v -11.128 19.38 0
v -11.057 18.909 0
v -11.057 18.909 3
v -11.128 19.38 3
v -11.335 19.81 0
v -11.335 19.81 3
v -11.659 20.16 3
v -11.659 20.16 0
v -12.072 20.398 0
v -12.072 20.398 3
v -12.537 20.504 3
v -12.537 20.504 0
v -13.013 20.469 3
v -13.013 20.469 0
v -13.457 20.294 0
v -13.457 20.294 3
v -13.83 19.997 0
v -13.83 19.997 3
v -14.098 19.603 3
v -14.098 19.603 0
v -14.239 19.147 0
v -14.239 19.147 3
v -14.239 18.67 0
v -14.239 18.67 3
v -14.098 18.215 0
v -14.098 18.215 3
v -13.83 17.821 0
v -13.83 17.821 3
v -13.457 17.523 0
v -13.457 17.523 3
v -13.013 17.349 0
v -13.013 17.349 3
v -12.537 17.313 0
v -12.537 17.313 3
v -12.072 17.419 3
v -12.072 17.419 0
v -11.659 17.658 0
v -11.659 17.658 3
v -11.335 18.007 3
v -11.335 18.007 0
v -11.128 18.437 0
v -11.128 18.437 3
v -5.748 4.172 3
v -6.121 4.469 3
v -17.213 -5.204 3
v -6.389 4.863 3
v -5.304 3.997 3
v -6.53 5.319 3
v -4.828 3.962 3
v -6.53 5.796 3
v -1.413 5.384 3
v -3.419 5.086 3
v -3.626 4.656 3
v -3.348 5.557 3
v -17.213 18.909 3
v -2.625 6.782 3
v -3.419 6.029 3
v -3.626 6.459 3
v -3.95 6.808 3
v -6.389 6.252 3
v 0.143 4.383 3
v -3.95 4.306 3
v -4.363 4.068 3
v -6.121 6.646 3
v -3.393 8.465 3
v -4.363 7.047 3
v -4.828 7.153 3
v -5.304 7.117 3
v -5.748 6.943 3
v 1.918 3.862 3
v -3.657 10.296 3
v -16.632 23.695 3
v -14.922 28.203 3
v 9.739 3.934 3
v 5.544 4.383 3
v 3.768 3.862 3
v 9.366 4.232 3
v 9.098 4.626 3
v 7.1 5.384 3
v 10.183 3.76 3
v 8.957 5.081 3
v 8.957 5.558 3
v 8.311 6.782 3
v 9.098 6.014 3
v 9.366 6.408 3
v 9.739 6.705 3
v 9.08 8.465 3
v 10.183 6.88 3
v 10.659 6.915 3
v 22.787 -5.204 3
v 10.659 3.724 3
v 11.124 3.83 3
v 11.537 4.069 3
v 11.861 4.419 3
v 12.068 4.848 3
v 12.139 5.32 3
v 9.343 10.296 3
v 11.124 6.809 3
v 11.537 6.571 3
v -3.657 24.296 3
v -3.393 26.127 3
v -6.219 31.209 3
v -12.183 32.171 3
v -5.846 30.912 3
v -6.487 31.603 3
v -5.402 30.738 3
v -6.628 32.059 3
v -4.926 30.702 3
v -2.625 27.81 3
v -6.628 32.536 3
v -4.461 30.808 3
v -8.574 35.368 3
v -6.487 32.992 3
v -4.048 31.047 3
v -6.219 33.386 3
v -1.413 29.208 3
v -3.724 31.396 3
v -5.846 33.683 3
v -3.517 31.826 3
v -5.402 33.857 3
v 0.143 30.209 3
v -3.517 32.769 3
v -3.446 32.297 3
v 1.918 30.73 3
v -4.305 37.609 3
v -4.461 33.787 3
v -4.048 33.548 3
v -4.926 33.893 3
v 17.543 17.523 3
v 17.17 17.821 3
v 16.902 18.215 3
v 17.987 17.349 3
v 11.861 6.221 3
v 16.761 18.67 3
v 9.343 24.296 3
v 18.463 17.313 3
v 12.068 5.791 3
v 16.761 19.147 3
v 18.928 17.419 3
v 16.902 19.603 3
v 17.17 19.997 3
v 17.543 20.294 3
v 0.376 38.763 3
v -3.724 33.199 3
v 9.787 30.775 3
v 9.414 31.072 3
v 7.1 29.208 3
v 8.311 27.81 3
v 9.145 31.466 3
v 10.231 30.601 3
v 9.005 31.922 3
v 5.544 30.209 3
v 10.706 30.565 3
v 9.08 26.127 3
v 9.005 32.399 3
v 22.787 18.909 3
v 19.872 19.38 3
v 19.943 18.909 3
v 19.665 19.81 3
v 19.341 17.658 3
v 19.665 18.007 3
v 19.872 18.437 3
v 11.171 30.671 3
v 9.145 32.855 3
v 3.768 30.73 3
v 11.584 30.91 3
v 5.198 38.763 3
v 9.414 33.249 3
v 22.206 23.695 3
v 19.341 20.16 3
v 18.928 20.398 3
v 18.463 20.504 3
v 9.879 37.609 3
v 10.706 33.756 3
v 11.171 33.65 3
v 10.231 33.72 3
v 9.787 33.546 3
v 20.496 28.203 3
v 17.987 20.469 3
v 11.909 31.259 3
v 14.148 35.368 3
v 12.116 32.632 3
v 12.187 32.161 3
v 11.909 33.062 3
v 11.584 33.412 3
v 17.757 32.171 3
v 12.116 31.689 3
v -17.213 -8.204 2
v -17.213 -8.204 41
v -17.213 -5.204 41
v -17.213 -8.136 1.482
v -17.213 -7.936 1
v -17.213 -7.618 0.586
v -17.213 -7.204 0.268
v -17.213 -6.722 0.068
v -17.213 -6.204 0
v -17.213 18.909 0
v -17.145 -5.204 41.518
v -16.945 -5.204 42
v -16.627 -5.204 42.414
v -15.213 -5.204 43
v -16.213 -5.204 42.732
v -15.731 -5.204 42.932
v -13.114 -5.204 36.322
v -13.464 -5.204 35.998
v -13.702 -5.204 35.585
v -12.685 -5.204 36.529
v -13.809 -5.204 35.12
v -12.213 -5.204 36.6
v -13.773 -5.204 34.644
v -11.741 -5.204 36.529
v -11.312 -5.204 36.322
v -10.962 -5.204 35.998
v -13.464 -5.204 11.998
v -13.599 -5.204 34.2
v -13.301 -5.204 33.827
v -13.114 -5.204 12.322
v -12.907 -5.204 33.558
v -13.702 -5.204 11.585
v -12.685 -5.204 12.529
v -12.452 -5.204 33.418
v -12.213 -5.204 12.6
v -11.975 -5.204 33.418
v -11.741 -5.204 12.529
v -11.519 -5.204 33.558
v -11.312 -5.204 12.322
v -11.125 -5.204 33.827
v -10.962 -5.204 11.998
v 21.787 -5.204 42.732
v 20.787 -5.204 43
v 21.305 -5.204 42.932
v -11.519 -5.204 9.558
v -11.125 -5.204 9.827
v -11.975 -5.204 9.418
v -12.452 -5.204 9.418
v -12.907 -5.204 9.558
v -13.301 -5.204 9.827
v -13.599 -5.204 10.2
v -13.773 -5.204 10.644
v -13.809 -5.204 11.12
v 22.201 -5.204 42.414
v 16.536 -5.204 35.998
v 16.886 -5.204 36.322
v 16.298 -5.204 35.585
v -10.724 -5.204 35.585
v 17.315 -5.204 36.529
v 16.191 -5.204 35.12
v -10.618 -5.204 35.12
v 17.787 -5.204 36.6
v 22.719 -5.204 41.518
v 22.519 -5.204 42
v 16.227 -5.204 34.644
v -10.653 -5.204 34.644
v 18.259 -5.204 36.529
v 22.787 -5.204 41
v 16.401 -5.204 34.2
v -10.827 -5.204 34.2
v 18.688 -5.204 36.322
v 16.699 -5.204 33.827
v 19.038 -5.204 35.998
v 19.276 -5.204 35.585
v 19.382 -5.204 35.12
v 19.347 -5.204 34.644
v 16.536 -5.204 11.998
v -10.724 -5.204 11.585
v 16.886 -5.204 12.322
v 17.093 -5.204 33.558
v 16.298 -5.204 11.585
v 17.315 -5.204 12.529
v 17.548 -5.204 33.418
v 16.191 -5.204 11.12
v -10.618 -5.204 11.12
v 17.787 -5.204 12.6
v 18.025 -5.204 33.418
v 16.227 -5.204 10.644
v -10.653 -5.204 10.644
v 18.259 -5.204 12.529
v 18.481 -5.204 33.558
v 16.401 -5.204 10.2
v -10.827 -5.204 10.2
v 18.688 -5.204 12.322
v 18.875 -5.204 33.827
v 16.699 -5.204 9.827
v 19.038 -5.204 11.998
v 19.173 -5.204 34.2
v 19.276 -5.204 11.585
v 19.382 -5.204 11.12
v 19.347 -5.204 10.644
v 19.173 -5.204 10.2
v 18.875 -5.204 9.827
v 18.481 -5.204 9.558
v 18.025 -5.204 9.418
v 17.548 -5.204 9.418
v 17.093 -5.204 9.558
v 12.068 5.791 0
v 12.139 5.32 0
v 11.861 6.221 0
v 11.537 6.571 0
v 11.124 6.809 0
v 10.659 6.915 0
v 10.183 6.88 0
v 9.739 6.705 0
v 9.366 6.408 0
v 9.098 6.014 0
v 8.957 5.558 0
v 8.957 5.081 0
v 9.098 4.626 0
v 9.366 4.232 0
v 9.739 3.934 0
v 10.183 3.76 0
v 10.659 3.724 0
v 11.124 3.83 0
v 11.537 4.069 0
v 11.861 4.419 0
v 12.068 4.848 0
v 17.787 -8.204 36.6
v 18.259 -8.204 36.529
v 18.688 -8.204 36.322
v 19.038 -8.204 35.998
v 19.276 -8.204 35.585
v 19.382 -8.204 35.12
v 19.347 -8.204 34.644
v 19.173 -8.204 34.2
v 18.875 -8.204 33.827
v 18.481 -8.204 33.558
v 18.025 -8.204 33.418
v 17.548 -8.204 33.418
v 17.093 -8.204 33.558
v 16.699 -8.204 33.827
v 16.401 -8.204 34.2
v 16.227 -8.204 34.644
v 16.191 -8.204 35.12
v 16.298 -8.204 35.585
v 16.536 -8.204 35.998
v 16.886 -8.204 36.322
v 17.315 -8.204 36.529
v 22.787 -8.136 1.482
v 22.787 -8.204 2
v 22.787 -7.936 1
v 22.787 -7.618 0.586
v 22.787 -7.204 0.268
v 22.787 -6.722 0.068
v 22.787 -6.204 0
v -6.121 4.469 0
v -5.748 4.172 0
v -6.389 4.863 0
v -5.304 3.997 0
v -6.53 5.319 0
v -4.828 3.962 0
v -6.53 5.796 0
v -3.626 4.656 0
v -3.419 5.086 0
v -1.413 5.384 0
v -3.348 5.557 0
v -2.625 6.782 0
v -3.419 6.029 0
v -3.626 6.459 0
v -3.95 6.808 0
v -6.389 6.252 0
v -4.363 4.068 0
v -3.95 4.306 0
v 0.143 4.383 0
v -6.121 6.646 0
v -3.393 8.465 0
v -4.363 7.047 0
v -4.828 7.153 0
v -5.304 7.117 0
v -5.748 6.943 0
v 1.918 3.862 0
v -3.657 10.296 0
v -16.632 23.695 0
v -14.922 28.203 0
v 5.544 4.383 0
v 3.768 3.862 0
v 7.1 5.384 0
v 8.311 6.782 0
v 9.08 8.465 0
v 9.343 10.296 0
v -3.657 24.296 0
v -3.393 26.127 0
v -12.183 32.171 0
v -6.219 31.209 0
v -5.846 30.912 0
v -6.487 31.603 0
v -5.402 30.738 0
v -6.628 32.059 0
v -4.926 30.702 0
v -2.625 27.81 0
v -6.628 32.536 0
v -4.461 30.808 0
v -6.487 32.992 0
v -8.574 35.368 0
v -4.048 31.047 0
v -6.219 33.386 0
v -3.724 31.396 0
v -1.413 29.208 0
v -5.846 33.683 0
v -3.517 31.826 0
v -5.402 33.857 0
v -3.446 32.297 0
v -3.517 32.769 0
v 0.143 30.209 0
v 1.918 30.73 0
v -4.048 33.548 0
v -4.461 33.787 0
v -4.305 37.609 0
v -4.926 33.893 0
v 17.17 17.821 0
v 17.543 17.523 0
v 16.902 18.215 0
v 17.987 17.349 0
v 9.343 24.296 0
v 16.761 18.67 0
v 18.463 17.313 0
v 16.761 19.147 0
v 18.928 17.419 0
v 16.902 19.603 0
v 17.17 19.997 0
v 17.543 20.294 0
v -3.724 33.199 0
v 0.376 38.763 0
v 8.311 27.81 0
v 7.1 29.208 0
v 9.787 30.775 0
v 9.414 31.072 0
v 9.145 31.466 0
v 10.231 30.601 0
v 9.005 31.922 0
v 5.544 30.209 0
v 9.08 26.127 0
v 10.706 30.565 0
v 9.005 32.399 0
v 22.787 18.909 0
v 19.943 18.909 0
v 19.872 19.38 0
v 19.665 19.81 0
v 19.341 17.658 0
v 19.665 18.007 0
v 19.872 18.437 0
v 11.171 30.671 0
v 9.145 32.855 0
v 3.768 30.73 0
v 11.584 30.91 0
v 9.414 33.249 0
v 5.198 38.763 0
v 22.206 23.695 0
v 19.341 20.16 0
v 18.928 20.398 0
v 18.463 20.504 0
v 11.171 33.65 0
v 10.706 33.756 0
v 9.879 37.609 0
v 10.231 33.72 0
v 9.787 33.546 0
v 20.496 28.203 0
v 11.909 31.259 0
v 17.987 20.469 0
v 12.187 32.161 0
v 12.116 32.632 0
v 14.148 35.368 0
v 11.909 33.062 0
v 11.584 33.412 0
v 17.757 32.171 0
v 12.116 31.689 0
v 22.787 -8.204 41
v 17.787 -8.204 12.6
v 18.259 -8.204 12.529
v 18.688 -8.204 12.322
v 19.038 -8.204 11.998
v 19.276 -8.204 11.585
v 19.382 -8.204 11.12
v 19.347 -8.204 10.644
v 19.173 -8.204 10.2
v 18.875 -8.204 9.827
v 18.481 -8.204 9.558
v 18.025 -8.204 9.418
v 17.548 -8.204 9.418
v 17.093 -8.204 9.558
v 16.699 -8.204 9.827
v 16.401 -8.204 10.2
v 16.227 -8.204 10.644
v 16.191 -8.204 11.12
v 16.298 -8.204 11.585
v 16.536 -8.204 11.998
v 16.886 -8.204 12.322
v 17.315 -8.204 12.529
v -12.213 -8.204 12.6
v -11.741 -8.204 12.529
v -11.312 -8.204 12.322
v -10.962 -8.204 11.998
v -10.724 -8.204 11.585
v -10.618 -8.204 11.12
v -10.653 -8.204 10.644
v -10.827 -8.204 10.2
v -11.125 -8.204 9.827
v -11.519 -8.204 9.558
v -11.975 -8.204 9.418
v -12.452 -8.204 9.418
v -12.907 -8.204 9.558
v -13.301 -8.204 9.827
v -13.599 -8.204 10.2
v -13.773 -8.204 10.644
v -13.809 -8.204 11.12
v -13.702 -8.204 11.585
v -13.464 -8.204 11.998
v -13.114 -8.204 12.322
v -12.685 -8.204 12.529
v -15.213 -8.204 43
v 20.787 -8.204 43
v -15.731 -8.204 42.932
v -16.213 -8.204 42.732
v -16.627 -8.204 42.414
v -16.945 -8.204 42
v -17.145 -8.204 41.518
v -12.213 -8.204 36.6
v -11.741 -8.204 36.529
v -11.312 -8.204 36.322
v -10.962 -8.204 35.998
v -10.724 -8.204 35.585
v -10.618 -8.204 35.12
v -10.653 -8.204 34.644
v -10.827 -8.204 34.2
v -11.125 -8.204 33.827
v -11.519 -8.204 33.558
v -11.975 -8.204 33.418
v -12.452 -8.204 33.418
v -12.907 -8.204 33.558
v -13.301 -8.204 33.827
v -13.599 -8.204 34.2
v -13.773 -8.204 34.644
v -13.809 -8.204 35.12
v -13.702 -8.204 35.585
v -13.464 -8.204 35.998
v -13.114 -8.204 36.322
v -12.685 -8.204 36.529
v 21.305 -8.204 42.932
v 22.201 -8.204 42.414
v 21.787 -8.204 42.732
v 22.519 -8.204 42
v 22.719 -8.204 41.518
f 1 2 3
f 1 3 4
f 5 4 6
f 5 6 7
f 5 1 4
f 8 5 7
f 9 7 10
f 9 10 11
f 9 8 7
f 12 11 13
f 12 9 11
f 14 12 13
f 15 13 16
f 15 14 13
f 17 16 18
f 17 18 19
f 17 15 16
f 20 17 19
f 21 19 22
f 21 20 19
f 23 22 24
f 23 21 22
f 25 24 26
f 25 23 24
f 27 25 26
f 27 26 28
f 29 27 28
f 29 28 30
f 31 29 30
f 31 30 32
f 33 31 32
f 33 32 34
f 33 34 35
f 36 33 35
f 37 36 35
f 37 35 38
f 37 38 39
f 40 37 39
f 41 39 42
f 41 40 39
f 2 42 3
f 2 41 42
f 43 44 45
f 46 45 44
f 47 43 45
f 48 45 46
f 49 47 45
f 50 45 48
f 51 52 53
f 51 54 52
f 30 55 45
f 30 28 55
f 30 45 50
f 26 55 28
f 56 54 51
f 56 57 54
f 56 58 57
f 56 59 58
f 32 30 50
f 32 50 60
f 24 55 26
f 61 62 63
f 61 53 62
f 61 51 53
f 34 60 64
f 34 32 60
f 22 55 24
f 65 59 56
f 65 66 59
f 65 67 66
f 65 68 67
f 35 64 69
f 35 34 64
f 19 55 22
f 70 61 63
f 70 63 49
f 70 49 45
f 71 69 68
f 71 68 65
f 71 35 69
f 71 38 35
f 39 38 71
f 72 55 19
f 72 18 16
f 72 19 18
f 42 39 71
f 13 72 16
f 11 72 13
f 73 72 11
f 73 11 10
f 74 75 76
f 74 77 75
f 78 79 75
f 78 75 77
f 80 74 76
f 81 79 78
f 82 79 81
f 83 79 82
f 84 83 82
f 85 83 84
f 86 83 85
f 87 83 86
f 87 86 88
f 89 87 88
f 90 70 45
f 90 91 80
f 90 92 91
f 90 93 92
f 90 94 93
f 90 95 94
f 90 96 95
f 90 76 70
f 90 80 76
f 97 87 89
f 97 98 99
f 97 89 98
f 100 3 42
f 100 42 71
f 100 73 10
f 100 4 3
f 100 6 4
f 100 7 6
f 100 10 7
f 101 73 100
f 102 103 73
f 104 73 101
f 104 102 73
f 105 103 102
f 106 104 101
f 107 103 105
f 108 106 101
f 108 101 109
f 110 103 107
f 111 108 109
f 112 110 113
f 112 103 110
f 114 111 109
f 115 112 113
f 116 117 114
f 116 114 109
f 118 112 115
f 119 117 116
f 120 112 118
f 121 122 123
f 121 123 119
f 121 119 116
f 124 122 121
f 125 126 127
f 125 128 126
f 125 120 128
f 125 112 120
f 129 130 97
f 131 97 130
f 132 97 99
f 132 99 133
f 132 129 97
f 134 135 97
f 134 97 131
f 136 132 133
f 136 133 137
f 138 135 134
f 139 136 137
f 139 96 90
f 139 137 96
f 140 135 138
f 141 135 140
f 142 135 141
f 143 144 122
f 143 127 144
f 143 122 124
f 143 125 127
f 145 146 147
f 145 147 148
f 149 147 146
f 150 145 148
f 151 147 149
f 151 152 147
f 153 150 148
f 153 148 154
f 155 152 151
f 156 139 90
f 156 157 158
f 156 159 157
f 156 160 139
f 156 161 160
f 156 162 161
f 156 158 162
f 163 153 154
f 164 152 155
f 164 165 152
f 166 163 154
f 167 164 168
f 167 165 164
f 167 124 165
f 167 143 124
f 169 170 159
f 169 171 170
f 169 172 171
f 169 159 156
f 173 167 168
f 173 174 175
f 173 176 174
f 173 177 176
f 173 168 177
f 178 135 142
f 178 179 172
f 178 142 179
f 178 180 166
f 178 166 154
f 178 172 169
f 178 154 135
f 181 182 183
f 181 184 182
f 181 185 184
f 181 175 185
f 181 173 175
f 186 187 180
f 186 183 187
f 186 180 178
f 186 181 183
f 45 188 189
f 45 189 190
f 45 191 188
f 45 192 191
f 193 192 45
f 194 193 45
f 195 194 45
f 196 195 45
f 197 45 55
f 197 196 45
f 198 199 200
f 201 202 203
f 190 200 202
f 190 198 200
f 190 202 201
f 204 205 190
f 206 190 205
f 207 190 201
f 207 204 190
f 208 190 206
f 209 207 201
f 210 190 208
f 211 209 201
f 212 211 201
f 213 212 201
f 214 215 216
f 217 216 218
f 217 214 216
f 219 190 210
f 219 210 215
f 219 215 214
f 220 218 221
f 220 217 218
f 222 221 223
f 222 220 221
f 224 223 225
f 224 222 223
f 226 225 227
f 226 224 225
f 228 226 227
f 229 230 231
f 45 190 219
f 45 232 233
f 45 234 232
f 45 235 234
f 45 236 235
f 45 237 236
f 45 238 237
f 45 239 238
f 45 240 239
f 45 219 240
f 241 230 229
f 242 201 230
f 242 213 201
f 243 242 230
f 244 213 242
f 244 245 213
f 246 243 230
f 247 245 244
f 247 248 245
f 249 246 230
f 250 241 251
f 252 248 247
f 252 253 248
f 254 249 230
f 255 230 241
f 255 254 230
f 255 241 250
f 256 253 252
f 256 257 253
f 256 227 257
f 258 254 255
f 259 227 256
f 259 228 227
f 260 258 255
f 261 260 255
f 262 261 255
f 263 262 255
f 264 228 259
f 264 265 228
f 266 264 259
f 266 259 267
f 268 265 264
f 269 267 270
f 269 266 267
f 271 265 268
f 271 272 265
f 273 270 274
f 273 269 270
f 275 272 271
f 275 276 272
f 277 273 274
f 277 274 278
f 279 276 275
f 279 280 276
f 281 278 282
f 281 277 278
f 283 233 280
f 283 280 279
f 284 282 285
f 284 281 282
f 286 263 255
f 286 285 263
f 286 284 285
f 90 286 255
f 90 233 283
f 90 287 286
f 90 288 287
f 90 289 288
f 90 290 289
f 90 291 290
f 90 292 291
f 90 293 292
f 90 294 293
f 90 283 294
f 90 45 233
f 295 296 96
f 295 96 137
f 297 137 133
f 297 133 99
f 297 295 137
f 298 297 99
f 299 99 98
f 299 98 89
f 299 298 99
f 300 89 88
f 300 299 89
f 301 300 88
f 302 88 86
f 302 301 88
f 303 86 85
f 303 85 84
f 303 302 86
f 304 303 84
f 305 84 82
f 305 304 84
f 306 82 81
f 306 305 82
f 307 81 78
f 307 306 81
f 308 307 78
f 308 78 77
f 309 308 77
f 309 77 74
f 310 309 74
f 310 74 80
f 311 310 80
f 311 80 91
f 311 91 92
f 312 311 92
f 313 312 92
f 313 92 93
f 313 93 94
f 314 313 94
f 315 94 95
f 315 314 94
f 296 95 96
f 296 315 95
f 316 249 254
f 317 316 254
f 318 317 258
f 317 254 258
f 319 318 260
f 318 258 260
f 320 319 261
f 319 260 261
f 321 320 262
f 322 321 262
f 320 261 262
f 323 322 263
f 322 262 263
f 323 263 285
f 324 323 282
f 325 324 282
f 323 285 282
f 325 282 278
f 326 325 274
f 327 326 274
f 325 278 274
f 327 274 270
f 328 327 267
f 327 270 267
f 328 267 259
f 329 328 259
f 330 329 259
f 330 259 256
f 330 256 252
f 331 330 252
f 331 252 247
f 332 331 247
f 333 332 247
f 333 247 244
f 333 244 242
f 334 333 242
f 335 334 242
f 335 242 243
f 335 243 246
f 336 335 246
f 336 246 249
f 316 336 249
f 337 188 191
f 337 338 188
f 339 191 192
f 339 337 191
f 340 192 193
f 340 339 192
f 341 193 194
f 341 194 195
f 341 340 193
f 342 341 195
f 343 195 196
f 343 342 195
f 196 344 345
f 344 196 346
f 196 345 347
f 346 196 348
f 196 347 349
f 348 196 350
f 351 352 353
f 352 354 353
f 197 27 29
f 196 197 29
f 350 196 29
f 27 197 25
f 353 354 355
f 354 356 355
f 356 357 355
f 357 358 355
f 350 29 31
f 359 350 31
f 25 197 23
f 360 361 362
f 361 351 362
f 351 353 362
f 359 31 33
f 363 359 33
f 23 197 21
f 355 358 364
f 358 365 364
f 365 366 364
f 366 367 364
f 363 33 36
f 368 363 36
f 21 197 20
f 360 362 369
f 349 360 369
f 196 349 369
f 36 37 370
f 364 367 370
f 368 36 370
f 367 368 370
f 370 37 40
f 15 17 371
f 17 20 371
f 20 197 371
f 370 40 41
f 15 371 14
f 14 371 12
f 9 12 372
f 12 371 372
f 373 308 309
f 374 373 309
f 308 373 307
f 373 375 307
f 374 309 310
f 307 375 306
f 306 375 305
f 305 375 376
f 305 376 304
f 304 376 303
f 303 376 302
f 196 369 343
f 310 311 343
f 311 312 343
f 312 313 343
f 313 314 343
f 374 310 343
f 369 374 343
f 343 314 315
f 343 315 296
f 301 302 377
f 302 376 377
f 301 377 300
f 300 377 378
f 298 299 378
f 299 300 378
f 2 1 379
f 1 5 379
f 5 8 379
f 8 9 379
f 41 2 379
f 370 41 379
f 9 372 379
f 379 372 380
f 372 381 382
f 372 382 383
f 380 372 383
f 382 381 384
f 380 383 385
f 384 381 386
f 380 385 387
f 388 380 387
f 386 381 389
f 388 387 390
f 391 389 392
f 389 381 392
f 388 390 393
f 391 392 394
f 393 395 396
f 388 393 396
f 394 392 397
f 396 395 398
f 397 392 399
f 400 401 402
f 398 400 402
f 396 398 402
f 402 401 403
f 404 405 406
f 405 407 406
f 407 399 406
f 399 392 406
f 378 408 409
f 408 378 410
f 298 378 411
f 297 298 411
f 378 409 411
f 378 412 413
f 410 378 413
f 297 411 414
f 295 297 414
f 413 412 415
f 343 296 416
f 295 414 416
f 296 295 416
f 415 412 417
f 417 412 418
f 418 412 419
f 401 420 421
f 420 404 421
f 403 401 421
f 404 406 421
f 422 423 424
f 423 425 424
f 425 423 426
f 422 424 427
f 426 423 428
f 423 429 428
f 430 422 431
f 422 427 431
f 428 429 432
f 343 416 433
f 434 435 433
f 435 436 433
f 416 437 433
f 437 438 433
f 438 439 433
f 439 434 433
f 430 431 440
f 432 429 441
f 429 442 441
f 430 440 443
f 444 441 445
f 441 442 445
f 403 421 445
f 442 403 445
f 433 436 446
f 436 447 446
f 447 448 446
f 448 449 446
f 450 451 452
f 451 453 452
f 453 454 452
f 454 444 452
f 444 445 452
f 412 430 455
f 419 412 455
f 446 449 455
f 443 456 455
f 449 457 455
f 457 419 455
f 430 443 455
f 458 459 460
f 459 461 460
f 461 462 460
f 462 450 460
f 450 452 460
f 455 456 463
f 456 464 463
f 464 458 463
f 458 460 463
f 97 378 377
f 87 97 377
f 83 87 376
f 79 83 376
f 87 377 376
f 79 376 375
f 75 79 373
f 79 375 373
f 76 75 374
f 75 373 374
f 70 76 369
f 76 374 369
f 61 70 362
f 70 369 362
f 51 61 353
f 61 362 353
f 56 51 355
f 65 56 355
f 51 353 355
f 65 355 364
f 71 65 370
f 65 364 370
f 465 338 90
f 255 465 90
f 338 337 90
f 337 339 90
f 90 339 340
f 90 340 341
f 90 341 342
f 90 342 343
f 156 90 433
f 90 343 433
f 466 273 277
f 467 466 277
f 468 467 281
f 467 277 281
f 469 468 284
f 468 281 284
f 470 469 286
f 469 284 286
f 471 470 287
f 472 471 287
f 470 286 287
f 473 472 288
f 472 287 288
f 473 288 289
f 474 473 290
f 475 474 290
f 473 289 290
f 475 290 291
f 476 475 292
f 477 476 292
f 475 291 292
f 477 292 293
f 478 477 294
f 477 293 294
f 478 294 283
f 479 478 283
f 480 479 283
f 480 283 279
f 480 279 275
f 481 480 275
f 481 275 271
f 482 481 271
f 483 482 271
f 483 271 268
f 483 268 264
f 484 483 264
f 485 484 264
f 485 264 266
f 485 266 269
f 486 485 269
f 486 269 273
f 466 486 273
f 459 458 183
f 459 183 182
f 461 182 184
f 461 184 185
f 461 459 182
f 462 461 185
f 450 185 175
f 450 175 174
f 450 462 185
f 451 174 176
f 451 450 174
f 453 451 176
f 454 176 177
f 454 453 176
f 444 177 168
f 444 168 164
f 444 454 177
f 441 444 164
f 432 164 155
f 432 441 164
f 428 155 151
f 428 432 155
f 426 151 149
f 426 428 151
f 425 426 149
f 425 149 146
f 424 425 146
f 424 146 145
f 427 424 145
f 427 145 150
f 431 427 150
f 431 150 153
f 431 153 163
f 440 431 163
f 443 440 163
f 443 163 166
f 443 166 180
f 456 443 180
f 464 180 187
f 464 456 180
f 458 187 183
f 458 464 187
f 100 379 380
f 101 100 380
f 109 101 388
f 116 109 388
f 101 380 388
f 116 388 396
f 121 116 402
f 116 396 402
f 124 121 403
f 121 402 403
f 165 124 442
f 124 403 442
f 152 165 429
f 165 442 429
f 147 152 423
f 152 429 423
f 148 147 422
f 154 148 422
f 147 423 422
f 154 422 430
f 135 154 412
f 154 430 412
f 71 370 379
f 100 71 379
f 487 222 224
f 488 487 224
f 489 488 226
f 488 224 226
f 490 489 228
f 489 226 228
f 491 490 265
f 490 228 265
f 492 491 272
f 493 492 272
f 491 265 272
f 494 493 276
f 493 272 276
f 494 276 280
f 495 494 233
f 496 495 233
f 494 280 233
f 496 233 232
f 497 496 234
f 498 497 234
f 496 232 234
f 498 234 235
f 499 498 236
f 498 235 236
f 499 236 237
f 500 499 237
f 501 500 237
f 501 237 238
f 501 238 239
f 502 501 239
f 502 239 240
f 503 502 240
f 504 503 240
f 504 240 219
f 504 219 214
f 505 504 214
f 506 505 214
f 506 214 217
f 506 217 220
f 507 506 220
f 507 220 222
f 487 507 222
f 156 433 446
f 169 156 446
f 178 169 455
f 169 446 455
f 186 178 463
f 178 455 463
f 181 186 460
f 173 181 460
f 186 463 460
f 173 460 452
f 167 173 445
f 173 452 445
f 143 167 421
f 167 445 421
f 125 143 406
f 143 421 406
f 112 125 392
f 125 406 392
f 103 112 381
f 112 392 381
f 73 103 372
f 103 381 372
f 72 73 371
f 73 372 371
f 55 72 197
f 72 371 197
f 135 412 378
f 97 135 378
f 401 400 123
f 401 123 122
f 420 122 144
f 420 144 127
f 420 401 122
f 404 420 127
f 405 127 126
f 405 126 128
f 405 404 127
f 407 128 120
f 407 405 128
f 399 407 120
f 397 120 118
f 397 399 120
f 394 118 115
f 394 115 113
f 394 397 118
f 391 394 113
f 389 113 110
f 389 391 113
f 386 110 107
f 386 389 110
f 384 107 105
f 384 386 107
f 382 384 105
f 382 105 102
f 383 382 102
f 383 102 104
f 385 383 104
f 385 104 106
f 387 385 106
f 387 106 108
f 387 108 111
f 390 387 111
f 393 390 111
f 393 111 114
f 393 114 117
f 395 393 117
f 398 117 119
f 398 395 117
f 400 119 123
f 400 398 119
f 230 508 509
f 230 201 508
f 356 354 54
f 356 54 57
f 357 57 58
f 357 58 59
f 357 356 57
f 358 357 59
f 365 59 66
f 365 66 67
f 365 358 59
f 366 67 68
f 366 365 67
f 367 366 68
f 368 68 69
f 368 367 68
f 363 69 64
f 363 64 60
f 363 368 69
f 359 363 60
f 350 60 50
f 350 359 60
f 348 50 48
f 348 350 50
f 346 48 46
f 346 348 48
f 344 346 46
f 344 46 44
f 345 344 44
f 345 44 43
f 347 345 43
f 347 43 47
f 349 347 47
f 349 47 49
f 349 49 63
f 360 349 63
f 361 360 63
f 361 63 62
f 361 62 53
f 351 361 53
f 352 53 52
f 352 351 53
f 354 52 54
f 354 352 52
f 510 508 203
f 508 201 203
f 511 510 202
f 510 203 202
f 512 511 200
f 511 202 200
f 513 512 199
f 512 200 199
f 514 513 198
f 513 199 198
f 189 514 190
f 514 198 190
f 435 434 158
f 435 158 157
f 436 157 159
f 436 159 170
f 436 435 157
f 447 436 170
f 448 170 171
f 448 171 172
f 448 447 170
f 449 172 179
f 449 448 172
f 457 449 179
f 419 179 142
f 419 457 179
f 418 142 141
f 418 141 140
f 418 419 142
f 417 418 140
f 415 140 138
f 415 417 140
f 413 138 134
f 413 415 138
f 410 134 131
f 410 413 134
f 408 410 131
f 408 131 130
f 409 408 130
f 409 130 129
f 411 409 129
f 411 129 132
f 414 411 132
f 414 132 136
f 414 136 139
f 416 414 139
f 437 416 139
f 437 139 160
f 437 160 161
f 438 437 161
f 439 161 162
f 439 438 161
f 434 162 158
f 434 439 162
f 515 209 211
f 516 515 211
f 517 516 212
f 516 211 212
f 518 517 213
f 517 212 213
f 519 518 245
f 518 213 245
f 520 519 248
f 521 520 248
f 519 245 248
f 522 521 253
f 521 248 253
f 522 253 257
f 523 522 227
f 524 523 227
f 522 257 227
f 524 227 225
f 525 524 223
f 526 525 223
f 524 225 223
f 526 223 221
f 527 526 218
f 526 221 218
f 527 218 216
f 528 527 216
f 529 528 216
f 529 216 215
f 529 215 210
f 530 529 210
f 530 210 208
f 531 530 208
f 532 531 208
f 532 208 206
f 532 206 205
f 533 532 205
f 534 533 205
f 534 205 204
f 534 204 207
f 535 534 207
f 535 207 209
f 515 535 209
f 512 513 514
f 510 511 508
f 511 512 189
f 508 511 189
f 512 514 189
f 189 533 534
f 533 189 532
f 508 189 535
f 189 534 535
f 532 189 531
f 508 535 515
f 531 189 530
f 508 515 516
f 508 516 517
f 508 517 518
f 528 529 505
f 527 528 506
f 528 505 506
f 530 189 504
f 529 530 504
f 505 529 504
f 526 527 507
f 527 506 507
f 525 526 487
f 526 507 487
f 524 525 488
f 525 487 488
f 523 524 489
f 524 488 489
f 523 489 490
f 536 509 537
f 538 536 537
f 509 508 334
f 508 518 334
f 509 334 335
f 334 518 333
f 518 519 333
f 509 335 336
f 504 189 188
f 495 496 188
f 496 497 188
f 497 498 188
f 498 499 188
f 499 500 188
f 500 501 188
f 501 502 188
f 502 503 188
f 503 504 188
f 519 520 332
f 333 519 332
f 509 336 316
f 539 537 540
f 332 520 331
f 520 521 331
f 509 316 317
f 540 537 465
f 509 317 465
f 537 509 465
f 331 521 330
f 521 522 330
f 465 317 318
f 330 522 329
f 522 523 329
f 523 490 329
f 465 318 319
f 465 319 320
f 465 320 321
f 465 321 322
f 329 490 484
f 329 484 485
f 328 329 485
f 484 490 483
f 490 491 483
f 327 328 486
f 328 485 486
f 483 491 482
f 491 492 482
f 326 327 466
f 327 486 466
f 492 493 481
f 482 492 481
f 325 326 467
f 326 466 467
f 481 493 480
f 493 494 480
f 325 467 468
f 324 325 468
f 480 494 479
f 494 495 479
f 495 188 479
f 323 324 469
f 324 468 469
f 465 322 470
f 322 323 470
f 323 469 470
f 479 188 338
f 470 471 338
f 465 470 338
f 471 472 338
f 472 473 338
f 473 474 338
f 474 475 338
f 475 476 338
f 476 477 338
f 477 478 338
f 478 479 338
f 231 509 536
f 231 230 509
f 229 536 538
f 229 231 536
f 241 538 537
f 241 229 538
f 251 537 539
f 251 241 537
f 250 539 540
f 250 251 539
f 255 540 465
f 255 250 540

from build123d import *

# Parameters (mm, degrees)
SKETCH_1_R          = 1.6
EXTRUDE_4_DEPTH     = 3
SKETCH_2_W          = 40
SKETCH_2_H          = 3
EXTRUDE_5_DEPTH     = 43
SKETCH_3_R          = 1.6
CUT_EXTRUDE_1_DEPTH = 63.306805946
FILLET_5_R          = 2
FILLET_6_R          = 2
FILLET_7_R          = 2


with BuildPart() as part:
    # 草图1 → 凸台-拉伸4 (new body)
    with BuildSketch(Plane.XY):
        with BuildLine():
            Line((-17.213055582, 18.908780902), (-17.213055582, -5.203950579))
            Line((-17.213055582, -5.203950579), (22.786944418, -5.203950579))
            Line((22.786944418, -5.203950579), (22.786944418, 18.908780902))
            ThreePointArc((22.786944418, 18.908780902), (2.786944418, 38.908780902), (-17.213055582, 18.908780902))
        make_face()
        with Locations((-4.94763916, 5.557362749)):
            Circle(SKETCH_1_R, mode=Mode.SUBTRACT)
        with Locations((10.539247833, 5.319833808)):
            Circle(SKETCH_1_R, mode=Mode.SUBTRACT)
        with Locations((-12.656689842, 18.908780902)):
            Circle(SKETCH_1_R, mode=Mode.SUBTRACT)
        with Locations((-5.045757748, 32.297473855)):
            Circle(SKETCH_1_R, mode=Mode.SUBTRACT)
        with BuildLine():
            ThreePointArc((9.343310158, 10.296049421), (2.843310158, 3.796049421), (-3.656689842, 10.296049421))
            Line((-3.656689842, 10.296049421), (-3.656689842, 24.296049421))
            ThreePointArc((-3.656689842, 24.296049421), (2.843310158, 30.796049421), (9.343310158, 24.296049421))
            Line((9.343310158, 24.296049421), (9.343310158, 10.296049421))
        make_face(mode=Mode.SUBTRACT)
        with Locations((18.343310158, 18.908780902)):
            Circle(SKETCH_1_R, mode=Mode.SUBTRACT)
        with Locations((10.586753622, 32.160604209)):
            Circle(SKETCH_1_R, mode=Mode.SUBTRACT)
    extrude(amount=EXTRUDE_4_DEPTH)

    # 草图2 → 凸台-拉伸5 (add)
    with BuildSketch(Plane.XY):
        with Locations((2.786944418, -6.703950579)):
            Rectangle(SKETCH_2_W, SKETCH_2_H)
    extrude(amount=EXTRUDE_5_DEPTH)

    # 草图3 → 切除-拉伸1 (cut, through all)
    with BuildSketch(Plane(origin=(0, 0, 0), x_dir=(1, 0, 0), z_dir=(0, 1, 0))):
        with Locations(Location((-12.213055582, -35, 0), (0, 0, 270))):
            Circle(SKETCH_3_R)
        with Locations(Location((17.786944418, -35, 0), (0, 0, 270))):
            Circle(SKETCH_3_R)
        with Locations(Location((17.786944418, -11, 0), (0, 0, 270))):
            Circle(SKETCH_3_R)
        with Locations(Location((-12.213055582, -11, 0), (0, 0, 270))):
            Circle(SKETCH_3_R)
    extrude(amount=-CUT_EXTRUDE_1_DEPTH, mode=Mode.SUBTRACT)

    # 圆角5
    fillet_5_edges = [part.edges().sort_by_distance(p)[0] for p in [
        (22.786944418, -6.703950579, 43),
    ]]
    fillet(fillet_5_edges, radius=FILLET_5_R)

    # 圆角6
    fillet_6_edges = [part.edges().sort_by_distance(p)[0] for p in [
        (-17.213055582, -6.703950579, 43),
    ]]
    fillet(fillet_6_edges, radius=FILLET_6_R)

    # 圆角7
    fillet_7_edges = [part.edges().sort_by_distance(p)[0] for p in [
        (2.786944418, -8.203950579, 0),
    ]]
    fillet(fillet_7_edges, radius=FILLET_7_R)


solid = part.part
